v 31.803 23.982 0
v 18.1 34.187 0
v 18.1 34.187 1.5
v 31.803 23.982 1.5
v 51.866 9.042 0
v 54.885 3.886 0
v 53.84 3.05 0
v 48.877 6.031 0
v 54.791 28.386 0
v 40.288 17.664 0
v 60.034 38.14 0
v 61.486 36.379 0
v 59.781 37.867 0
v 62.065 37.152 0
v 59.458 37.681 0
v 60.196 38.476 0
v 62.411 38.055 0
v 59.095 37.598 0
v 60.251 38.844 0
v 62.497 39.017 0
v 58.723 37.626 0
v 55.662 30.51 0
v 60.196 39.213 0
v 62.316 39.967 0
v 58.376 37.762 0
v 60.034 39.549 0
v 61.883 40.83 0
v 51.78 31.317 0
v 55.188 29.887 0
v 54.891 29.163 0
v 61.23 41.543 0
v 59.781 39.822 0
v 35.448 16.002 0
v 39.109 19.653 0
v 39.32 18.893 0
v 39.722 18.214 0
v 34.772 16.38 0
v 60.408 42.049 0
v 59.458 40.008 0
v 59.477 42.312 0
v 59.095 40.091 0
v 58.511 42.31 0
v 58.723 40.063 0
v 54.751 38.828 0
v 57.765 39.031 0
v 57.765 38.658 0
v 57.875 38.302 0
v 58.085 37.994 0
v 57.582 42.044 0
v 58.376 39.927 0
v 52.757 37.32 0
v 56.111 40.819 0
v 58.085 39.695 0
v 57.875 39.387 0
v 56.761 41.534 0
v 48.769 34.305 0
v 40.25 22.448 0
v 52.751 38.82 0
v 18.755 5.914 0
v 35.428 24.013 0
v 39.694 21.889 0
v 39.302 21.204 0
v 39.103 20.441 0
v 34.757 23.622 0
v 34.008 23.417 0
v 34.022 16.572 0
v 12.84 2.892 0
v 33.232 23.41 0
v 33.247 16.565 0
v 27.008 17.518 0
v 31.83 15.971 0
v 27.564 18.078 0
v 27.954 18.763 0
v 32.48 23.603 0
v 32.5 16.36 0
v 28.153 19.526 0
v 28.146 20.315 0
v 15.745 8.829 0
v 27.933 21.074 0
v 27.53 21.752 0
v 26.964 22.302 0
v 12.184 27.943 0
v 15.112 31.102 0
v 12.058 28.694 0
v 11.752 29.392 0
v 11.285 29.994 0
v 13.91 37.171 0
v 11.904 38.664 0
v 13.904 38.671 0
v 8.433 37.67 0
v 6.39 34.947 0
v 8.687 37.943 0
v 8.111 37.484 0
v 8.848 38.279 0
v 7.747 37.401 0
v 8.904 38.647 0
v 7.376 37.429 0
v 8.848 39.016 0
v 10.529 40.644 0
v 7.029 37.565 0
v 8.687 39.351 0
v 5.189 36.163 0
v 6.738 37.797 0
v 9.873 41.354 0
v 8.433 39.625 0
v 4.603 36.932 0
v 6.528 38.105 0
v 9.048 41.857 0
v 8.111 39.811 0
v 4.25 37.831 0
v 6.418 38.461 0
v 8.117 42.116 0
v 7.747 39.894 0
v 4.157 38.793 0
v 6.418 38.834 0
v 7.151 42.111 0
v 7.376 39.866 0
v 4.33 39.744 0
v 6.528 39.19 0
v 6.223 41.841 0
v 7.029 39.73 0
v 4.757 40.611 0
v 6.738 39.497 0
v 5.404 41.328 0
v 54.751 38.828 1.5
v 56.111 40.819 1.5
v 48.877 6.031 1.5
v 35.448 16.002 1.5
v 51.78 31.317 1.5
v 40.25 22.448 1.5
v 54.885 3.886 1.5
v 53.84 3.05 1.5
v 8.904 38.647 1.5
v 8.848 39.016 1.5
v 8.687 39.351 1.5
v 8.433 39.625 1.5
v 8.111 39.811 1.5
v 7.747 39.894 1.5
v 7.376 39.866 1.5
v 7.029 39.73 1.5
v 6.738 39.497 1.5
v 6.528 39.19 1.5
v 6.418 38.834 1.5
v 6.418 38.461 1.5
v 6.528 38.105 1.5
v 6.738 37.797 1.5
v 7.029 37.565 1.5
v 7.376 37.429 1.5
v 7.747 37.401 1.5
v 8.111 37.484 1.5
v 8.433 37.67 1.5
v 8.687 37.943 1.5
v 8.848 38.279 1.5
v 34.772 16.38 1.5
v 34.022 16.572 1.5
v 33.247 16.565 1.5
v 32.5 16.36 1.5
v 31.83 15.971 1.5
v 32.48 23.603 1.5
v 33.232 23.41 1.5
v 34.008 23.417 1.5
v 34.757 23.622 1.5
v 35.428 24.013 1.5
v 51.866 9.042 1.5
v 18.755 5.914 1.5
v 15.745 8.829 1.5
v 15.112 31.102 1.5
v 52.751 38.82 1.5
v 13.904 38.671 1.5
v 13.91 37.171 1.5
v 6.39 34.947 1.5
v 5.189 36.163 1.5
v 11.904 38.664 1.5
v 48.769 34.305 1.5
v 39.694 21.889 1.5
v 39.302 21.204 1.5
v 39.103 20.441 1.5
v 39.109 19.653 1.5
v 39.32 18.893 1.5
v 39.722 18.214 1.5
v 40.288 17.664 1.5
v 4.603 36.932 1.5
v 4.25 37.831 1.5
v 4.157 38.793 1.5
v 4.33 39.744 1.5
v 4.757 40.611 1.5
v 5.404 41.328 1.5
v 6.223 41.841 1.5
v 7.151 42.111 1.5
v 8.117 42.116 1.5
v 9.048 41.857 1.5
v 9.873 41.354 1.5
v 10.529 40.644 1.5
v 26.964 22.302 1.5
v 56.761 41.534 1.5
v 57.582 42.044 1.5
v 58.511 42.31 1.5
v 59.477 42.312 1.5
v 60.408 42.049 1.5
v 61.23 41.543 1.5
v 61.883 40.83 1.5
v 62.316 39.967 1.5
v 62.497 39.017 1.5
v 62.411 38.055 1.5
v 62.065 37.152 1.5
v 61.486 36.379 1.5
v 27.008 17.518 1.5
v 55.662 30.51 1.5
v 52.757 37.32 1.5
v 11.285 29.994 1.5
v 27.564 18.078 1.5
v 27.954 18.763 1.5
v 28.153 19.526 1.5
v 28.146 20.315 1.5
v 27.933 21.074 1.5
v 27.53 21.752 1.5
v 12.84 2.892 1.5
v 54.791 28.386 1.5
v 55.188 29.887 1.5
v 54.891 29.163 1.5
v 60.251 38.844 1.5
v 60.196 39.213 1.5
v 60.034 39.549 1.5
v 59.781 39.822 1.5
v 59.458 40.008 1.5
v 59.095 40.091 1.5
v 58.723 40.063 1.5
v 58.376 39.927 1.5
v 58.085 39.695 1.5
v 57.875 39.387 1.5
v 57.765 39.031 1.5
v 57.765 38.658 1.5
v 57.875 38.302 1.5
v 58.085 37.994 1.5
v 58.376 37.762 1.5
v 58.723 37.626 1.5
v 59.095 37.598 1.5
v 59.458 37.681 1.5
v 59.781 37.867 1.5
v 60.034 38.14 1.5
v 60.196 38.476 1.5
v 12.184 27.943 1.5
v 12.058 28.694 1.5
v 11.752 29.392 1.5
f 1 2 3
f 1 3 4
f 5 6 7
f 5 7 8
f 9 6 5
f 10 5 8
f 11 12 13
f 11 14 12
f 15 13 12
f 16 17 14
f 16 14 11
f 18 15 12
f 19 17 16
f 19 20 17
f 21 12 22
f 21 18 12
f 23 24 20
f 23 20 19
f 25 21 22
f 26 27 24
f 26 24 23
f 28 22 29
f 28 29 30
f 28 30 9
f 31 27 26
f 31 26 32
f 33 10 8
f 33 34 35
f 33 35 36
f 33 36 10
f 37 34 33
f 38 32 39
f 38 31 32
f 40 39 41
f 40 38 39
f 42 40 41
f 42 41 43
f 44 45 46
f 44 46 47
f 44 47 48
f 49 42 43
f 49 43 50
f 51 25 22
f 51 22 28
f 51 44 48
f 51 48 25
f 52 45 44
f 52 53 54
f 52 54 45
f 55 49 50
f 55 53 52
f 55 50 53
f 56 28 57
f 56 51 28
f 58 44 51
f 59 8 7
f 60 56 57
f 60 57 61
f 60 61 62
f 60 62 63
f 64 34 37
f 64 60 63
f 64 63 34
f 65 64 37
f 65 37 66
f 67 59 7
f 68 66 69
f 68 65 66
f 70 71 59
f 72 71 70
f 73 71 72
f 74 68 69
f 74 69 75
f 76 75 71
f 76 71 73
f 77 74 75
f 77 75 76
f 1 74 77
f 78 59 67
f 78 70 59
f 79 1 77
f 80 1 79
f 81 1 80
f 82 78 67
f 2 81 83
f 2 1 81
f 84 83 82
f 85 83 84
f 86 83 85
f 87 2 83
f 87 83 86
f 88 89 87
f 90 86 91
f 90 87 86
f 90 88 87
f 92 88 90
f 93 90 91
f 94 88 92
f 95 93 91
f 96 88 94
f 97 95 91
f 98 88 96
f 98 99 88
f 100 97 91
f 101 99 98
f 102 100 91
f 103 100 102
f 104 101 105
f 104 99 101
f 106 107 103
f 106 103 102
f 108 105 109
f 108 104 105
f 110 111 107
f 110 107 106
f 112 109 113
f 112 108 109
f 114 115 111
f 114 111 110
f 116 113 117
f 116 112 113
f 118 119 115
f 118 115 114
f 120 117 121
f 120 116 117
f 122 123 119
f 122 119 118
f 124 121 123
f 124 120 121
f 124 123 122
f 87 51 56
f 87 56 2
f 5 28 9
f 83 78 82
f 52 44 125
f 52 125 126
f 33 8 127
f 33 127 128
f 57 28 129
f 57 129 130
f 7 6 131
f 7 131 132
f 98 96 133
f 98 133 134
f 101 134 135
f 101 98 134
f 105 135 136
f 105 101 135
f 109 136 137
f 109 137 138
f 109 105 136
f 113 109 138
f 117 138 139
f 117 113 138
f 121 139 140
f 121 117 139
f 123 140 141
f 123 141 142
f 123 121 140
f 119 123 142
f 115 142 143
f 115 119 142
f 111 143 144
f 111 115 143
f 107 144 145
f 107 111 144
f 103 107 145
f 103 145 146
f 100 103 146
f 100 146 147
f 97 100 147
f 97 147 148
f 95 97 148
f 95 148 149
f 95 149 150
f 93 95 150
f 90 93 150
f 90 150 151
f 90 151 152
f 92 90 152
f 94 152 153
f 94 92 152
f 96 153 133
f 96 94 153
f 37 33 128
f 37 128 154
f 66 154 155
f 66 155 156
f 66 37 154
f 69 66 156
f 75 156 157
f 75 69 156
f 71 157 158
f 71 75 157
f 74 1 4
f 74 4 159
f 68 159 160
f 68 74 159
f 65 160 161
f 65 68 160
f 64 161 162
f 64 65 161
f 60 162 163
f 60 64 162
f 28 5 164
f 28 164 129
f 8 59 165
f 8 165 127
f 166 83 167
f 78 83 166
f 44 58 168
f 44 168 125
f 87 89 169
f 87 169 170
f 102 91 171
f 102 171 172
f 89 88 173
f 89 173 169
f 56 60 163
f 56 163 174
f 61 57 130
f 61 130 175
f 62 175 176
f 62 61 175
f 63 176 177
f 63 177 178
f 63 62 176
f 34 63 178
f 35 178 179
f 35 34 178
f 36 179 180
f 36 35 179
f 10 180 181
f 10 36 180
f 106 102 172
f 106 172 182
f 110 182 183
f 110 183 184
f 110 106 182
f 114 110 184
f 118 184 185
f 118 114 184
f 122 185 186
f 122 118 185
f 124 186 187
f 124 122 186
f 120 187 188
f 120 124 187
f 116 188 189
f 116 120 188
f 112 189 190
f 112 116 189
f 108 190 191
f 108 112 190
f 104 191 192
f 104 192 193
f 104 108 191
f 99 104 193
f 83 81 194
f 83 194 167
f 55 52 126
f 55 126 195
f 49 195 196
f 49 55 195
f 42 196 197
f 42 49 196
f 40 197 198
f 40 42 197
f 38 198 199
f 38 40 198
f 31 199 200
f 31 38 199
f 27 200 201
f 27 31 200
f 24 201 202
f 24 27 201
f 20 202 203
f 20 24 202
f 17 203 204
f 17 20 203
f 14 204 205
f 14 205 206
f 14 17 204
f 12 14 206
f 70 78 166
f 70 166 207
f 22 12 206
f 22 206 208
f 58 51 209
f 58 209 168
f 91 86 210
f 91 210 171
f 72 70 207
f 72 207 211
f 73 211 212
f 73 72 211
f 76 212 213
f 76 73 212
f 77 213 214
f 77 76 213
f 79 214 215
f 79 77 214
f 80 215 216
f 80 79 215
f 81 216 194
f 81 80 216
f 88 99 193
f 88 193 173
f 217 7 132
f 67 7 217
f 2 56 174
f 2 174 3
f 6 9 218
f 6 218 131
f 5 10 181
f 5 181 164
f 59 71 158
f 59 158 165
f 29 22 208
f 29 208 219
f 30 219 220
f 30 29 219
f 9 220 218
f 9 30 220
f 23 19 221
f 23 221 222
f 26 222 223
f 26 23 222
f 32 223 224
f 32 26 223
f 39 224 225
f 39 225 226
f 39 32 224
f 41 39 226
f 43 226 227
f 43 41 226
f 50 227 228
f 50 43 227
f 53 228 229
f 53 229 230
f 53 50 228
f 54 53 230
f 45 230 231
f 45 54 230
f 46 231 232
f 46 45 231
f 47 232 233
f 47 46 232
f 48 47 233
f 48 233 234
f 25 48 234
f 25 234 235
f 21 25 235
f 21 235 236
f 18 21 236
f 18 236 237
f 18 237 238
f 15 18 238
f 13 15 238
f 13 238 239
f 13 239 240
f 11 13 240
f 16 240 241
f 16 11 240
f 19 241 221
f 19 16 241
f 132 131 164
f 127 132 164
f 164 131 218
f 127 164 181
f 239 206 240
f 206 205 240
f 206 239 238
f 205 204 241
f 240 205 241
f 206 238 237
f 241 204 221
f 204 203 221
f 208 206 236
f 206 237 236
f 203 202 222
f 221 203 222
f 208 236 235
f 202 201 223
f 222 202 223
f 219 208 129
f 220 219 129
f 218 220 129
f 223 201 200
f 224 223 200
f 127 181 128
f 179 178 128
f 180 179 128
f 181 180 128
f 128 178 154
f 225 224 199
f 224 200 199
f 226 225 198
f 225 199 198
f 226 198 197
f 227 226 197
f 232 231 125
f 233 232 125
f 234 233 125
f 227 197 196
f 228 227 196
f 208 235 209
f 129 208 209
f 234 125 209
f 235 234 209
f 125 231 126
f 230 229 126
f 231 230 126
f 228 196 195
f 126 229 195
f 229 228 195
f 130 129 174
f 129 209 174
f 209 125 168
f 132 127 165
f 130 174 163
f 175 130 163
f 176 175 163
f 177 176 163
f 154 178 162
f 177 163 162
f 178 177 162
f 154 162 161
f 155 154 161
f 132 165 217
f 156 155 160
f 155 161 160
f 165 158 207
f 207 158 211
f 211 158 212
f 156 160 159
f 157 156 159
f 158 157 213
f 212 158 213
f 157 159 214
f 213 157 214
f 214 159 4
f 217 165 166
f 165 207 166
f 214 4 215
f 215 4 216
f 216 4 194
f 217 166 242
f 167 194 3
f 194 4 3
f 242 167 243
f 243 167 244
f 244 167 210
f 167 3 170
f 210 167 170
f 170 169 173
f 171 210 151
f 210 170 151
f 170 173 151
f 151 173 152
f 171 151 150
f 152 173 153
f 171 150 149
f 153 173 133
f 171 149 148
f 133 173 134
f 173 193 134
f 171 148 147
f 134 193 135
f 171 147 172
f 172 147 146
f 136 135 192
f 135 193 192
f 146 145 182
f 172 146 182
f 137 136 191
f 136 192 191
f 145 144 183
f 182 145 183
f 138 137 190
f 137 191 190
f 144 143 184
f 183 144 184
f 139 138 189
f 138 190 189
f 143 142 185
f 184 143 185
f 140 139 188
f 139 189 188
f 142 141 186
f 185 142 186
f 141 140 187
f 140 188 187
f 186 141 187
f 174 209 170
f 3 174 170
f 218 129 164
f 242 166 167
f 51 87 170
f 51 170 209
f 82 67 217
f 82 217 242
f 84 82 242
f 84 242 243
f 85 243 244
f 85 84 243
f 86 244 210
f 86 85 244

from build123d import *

# Parameters (mm, degrees)
SKETCH_1_R      = 1.25
EXTRUDE_1_DEPTH = 1.5


with BuildPart() as part:
    # 草图1 → 凸台-拉伸1 (new body)
    with BuildSketch(Plane.XY):
        with BuildLine():
            Line((61.485606927, 36.379045593), (55.661903622, 30.510449214))
            ThreePointArc((55.661903622, 30.510449214), (55.015327208, 29.534689328), (54.791375635, 28.385770659))
            Line((54.791375635, 28.385770659), (54.885447805, 3.885951263))
            Line((54.885447805, 3.885951263), (53.839506367, 3.049659841))
            Line((53.839506367, 3.049659841), (12.839808602, 2.892232945))
            Line((12.839808602, 2.892232945), (12.184344201, 27.942846038))
            ThreePointArc((12.184344201, 27.942846038), (11.926294769, 29.05242031), (11.284734435, 29.993773012))
            Line((11.284734435, 29.993773012), (6.389951155, 34.947075309))
            Line((6.389951155, 34.947075309), (5.188508902, 36.162881267))
            ThreePointArc((5.188508902, 36.162881267), (5.404097854, 41.328389075), (10.528570268, 40.643749035))
            Line((10.528570268, 40.643749035), (11.903832696, 38.663553725))
            Line((11.903832696, 38.663553725), (13.903817953, 38.671233086))
            Line((13.903817953, 38.671233086), (13.909577473, 37.171244144))
            Line((13.909577473, 37.171244144), (52.757056868, 37.320407148))
            Line((52.757056868, 37.320407148), (52.751297347, 38.820396091))
            Line((52.751297347, 38.820396091), (54.751282604, 38.828075452))
            Line((54.751282604, 38.828075452), (56.111289997, 40.818768719))
            ThreePointArc((56.111289997, 40.818768719), (61.230354838, 41.542747399), (61.485606927, 36.379045593))
        make_face()
        with Locations((59.00124888, 38.844398528)):
            Circle(SKETCH_1_R, mode=Mode.SUBTRACT)
        with Locations((7.653861631, 38.647239518)):
            Circle(SKETCH_1_R, mode=Mode.SUBTRACT)
        with BuildLine():
            Line((35.427528313, 24.013077802), (48.768603001, 34.305074976))
            Line((48.768603001, 34.305074976), (18.099515168, 34.187314613))
            Line((18.099515168, 34.187314613), (31.803272227, 23.982277822))
            ThreePointArc((31.803272227, 23.982277822), (33.620577188, 23.388506116), (35.427528313, 24.013077802))
        make_face(mode=Mode.SUBTRACT)
        with BuildLine():
            Line((40.287692252, 17.664023775), (51.865627723, 9.042062882))
            Line((51.865627723, 9.042062882), (51.780099927, 31.316616132))
            Line((51.780099927, 31.316616132), (40.250425641, 22.448057755))
            ThreePointArc((40.250425641, 22.448057755), (39.07959428, 20.046775087), (40.287692252, 17.664023775))
        make_face(mode=Mode.SUBTRACT)
        with BuildLine():
            Line((26.964065744, 22.301778302), (15.112244568, 31.102127061))
            Line((15.112244568, 31.102127061), (15.745126999, 8.829052268))
            Line((15.745126999, 8.829052268), (27.00804452, 17.517851185))
            ThreePointArc((27.00804452, 17.517851185), (28.175472686, 19.920749093), (26.964065744, 22.301778302))
        make_face(mode=Mode.SUBTRACT)
        with BuildLine():
            Line((48.877230949, 6.030566195), (35.448021091, 16.002175498))
            ThreePointArc((35.448021091, 16.002175498), (33.634102155, 16.593460395), (31.83047717, 15.971482382))
            Line((31.83047717, 15.971482382), (18.755497751, 5.914284289))
            Line((18.755497751, 5.914284289), (48.877230949, 6.030566195))
        make_face(mode=Mode.SUBTRACT)
    extrude(amount=EXTRUDE_1_DEPTH)


solid = part.part
